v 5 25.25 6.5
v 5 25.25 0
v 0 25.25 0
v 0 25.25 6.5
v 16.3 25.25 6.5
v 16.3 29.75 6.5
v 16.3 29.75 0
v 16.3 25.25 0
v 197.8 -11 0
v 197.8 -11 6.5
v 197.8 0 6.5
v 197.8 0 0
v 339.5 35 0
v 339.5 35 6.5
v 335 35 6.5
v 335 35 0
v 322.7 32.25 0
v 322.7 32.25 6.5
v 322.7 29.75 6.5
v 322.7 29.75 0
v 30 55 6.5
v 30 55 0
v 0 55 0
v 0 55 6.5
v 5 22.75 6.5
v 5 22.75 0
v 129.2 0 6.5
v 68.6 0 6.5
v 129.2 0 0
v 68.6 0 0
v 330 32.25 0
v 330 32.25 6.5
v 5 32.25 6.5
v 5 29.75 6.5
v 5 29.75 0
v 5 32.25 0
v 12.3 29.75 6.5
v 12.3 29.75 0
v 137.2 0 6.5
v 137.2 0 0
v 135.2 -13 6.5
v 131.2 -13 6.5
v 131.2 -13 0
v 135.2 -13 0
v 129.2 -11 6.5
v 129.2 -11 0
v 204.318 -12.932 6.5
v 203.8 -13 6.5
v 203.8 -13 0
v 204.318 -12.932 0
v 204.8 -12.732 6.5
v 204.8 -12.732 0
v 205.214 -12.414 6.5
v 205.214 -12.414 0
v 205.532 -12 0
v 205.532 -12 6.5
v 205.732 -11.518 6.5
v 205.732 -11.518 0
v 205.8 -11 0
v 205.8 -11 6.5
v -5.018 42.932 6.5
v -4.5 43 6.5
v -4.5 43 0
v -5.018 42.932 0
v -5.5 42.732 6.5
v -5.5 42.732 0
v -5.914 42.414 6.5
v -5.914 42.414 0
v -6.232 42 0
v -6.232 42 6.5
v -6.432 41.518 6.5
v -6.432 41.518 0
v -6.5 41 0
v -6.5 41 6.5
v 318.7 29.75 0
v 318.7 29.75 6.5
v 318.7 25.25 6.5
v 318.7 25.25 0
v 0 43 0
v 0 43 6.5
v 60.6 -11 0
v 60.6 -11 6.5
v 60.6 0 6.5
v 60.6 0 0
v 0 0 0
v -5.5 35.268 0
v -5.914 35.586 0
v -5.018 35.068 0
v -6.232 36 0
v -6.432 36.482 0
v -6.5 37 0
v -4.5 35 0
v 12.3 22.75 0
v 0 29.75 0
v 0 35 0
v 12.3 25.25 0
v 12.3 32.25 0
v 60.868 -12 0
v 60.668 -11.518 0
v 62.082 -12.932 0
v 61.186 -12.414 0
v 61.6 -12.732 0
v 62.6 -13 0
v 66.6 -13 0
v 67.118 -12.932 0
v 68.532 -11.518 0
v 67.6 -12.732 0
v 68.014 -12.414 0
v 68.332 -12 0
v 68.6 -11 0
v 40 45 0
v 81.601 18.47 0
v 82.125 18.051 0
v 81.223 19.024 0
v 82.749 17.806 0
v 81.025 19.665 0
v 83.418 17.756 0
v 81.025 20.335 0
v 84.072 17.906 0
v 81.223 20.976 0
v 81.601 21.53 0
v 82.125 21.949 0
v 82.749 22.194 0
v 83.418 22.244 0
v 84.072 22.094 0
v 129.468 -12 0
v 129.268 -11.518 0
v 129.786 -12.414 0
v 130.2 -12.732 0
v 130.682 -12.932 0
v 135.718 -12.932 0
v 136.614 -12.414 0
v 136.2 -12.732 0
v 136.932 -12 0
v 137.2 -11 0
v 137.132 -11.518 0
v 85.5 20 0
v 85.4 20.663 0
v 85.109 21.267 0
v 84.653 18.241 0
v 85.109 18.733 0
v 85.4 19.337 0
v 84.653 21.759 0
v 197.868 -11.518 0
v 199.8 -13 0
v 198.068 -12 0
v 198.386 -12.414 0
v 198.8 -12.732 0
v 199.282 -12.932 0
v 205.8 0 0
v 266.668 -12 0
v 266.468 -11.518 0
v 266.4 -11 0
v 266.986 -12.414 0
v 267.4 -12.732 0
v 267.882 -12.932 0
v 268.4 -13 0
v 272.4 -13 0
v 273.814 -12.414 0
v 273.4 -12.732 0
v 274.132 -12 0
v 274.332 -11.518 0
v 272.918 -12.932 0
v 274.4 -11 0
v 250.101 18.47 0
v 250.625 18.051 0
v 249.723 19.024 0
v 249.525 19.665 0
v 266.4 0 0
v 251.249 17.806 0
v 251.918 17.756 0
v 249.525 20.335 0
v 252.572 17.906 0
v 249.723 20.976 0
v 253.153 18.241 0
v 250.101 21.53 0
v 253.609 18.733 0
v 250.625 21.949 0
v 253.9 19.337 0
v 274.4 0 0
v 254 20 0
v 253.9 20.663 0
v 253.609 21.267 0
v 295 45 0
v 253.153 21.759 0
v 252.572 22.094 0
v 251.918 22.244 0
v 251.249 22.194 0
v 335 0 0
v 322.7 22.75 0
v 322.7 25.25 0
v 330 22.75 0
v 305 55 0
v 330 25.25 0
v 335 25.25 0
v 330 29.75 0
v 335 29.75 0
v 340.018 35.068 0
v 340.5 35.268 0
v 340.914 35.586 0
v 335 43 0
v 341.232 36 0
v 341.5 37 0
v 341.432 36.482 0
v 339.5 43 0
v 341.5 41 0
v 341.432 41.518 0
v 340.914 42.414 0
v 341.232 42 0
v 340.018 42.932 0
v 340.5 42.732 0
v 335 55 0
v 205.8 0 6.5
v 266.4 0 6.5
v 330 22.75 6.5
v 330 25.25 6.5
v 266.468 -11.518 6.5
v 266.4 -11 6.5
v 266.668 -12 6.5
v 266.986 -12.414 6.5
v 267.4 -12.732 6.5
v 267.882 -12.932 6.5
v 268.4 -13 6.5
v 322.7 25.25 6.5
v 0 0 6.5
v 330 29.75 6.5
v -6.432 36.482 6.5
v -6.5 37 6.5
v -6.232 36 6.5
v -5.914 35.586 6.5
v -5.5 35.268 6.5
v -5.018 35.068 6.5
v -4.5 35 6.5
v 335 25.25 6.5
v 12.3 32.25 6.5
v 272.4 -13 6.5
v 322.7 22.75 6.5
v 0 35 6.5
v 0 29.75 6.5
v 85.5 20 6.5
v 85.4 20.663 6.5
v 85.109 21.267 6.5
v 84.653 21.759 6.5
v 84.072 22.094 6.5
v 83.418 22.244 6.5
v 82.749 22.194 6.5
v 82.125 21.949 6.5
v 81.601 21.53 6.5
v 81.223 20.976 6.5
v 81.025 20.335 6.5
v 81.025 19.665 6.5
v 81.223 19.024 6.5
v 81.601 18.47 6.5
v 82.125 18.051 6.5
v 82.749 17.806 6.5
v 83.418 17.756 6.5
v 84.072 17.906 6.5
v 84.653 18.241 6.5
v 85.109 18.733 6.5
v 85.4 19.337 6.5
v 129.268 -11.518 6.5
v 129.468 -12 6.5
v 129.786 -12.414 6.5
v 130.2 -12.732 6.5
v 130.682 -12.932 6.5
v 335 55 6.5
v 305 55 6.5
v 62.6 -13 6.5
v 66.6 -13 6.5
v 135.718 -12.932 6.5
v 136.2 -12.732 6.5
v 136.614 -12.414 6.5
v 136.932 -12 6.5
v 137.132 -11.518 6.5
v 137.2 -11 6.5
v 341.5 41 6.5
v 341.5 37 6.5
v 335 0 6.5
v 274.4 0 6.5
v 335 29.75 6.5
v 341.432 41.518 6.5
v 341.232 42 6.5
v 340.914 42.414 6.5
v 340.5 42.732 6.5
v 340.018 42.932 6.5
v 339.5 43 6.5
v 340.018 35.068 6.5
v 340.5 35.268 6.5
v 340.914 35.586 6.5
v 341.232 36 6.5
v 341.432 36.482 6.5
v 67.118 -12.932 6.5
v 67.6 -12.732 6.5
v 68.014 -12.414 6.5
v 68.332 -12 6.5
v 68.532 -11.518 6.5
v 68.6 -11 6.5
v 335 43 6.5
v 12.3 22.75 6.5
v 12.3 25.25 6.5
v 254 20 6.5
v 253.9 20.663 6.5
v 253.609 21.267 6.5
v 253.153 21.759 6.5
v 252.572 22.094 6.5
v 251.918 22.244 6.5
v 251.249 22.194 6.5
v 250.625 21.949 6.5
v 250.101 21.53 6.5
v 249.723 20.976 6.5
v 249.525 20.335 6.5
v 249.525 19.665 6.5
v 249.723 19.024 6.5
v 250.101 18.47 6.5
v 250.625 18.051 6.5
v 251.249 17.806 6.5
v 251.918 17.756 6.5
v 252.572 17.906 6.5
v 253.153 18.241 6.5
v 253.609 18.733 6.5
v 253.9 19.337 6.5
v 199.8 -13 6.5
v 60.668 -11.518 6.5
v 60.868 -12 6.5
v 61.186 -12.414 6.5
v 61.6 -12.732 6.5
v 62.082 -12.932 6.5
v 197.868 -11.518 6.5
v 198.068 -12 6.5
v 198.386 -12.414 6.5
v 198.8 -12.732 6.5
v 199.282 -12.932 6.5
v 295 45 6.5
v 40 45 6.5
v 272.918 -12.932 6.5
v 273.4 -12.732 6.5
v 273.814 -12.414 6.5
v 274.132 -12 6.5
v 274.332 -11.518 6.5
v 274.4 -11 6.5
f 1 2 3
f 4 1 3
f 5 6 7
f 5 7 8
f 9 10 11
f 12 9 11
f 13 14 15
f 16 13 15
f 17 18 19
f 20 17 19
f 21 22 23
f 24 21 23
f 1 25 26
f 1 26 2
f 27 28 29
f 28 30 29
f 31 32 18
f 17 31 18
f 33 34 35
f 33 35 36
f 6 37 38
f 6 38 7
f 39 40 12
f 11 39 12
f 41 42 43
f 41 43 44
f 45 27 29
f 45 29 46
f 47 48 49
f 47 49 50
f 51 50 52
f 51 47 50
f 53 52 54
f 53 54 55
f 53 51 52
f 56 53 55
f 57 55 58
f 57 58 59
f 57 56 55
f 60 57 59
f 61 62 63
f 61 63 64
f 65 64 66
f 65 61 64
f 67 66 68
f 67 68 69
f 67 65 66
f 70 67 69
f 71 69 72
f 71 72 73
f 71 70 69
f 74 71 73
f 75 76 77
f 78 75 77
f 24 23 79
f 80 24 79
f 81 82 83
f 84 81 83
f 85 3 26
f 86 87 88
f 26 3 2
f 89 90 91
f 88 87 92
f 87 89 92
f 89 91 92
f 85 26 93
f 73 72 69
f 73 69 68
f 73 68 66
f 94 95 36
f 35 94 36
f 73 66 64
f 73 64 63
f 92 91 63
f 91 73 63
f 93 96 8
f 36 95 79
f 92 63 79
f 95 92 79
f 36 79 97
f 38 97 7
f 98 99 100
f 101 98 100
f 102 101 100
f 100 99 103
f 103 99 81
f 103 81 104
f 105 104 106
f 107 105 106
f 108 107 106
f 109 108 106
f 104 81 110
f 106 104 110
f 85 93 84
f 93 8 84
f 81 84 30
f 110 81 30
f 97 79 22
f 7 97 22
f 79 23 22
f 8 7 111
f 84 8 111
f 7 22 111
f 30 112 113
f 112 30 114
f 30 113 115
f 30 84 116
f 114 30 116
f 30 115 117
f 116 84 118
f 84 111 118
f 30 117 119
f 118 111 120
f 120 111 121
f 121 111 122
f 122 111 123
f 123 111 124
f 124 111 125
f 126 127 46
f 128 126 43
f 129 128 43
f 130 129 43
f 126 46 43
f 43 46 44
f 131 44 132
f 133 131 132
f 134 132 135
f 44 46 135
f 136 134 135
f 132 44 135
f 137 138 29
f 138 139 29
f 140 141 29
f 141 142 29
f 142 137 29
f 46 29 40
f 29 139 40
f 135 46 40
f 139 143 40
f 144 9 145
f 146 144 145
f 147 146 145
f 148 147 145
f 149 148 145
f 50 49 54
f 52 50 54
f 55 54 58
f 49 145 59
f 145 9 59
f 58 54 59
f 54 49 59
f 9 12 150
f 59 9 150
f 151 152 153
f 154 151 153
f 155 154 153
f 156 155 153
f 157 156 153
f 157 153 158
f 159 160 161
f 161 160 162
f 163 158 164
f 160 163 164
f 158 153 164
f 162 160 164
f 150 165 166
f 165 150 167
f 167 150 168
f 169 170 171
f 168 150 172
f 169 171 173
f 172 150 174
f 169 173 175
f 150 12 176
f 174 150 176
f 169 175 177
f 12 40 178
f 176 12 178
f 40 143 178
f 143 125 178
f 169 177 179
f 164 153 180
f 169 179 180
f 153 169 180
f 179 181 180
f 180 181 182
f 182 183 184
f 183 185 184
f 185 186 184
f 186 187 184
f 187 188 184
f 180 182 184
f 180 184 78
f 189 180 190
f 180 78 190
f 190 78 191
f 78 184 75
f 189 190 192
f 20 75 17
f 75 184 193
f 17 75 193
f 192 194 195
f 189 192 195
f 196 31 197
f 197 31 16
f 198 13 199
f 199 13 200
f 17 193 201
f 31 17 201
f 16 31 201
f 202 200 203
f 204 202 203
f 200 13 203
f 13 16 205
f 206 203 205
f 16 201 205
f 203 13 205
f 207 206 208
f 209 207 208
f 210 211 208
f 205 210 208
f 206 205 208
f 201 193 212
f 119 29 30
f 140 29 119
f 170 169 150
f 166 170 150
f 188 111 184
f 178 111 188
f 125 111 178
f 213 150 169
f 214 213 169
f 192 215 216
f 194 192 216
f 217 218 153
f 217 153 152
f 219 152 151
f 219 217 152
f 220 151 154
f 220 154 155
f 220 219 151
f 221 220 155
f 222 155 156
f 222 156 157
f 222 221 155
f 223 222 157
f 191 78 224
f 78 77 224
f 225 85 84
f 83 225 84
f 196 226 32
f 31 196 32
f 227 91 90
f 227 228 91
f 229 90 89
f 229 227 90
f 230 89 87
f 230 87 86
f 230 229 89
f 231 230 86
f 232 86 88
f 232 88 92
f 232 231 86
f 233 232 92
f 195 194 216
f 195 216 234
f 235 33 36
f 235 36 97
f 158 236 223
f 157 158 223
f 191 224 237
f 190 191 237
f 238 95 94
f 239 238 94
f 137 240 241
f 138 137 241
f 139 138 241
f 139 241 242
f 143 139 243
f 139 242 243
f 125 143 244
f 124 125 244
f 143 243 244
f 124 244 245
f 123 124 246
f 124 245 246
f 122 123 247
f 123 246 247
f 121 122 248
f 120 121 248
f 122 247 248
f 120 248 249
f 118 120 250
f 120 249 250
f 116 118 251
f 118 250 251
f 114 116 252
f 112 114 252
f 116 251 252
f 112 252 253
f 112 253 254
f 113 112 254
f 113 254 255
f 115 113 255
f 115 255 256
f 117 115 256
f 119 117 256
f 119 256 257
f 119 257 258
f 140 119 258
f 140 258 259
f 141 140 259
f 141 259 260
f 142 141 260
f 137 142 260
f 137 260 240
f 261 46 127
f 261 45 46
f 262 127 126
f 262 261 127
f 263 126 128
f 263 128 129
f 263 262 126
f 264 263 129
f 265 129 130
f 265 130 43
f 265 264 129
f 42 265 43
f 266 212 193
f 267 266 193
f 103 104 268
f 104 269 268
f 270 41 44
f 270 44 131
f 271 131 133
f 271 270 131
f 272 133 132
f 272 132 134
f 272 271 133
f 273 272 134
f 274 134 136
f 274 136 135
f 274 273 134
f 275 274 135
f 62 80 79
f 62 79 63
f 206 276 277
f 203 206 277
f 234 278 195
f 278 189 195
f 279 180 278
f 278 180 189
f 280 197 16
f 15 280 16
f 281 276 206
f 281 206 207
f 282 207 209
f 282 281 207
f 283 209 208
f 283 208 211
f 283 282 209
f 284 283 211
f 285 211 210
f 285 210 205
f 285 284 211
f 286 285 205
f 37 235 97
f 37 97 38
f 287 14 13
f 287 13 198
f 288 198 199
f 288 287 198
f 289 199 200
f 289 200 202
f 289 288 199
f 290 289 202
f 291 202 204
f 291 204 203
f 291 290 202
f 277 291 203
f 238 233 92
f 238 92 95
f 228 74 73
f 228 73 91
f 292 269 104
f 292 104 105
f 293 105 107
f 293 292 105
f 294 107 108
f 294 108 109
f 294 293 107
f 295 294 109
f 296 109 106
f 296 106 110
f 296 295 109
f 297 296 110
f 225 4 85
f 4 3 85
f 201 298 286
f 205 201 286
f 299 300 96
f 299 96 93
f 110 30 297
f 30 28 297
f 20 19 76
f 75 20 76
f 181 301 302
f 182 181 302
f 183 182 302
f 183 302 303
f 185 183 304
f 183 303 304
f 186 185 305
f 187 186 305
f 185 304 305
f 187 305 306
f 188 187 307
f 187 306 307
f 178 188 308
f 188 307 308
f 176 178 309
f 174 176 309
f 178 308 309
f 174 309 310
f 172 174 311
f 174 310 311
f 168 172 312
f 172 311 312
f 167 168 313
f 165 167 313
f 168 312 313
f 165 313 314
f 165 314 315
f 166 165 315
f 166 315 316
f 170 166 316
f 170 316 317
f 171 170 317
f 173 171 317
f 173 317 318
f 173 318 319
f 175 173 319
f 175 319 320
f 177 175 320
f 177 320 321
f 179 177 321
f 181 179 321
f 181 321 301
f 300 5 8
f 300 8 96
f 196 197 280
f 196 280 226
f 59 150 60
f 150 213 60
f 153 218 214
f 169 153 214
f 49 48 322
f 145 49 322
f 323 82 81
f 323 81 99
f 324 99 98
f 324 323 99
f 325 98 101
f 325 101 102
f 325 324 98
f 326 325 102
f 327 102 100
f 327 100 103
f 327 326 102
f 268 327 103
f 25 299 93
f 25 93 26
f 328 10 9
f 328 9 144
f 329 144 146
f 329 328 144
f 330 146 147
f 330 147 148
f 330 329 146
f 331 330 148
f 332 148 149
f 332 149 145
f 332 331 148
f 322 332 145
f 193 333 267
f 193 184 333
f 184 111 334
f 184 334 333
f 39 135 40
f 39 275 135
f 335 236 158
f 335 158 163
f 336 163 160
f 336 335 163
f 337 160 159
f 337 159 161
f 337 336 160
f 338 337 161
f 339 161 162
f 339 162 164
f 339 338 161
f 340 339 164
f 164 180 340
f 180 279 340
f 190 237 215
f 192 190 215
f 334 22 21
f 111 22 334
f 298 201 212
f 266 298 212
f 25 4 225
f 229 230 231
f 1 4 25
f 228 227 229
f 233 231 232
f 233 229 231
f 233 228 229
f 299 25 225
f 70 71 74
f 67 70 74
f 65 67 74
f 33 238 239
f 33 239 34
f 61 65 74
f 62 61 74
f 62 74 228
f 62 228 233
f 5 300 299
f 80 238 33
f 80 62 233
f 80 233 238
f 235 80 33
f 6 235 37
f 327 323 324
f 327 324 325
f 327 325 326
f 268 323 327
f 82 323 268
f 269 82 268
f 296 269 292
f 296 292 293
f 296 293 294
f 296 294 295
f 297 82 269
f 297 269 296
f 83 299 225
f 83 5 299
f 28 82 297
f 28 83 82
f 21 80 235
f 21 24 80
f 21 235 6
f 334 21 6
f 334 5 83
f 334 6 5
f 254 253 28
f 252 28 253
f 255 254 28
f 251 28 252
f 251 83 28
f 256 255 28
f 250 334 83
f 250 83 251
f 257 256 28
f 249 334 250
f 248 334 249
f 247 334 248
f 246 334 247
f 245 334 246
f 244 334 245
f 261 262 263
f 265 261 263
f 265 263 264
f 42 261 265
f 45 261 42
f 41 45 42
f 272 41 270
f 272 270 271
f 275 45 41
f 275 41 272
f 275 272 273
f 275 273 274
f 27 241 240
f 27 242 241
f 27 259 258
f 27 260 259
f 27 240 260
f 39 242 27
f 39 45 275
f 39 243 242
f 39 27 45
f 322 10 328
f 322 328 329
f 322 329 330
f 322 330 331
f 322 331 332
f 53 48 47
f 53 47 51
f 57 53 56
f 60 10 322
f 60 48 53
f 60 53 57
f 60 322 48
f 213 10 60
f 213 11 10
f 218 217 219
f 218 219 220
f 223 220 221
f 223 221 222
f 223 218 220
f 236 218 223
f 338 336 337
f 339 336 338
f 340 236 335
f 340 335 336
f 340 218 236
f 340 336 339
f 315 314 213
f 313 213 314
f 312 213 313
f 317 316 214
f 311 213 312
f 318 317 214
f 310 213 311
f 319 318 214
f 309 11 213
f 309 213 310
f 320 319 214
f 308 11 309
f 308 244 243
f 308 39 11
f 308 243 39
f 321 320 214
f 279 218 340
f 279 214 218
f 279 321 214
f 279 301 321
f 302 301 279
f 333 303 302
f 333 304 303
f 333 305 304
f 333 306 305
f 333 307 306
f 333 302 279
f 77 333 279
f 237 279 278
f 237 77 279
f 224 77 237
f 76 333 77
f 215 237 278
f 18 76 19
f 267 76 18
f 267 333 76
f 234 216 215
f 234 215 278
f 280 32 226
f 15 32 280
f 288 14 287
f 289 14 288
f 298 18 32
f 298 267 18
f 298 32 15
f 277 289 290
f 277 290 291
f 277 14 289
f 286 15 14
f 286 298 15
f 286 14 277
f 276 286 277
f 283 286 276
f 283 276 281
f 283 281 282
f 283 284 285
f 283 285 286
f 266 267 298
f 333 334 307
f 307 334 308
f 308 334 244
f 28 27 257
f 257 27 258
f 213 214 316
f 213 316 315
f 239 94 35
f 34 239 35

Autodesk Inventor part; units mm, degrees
ref_plane "YZ Plane" through (0, 0, 0) normal (1, 0, 0) x (0, 1, 0)
ref_plane "XZ Plane" through (0, 0, 0) normal (0, 1, 0) x (-1, 0, 0)
ref_plane "XY Plane" through (0, 0, 0) normal (0, 0, 1) x (1, 0, 0)
sketch "Sketch1" plane through (0, 0, 0) normal (0, 0, 1) x (1, 0, 0)
  line L0 (0, 0) -> (335, 0)
  line L1 (335, 0) -> (335, 55)
  line L2 (0, 55) -> (0, 0)
  line L3 (30, 55) -> (40, 45)
  line L4 (40, 45) -> (295, 45)
  line L5 (295, 45) -> (305, 55)
  line L6 (335, 55) -> (305, 55)
  line L7 (30, 55) -> (0, 55)
  dimension "d0" = 335
  dimension "d1" = 55
  dimension "d2" = 45
  dimension "d3" = 30
  dimension "d4" = 10
  dimension "d5" = 30
extrude "Extrusion1" add sketch "Sketch1" along normal blind 6.5
sketch "Sketch2" plane through (0, 0, 6.5) normal (0, 0, 1) x (1, 0, 0)
  line L0 (0, 0) -> (335, 0) projected
  line L1 (295, 45) -> (40, 45) projected
  line L2 (0, 55) -> (0, 0) projected
  line L3 (0, 25.25) -> (0, 29.75)
  line L4 (16.3, 29.75) -> (16.3, 25.25)
  line L5 (5, 32.25) -> (12.3, 32.25)
  line L6 (12.3, 22.75) -> (5, 22.75)
  line L7 (0, 29.75) -> (5, 29.75)
  line L8 (12.3, 29.75) -> (16.3, 29.75)
  line L9 (16.3, 25.25) -> (12.3, 25.25)
  line L10 (5, 25.25) -> (0, 25.25)
  line L11 (5, 22.75) -> (5, 25.25)
  line L12 (5, 29.75) -> (5, 32.25)
  line L13 (12.3, 32.25) -> (12.3, 29.75)
  line L14 (12.3, 25.25) -> (12.3, 22.75)
  line L15 (167.5, 0) -> (167.5, 45) construction
  line L16 (335, 25.25) -> (335, 29.75)
  line L17 (318.7, 29.75) -> (318.7, 25.25)
  line L18 (330, 32.25) -> (322.7, 32.25)
  line L19 (322.7, 22.75) -> (330, 22.75)
  line L20 (335, 29.75) -> (330, 29.75)
  line L21 (322.7, 29.75) -> (318.7, 29.75)
  line L22 (318.7, 25.25) -> (322.7, 25.25)
  line L23 (330, 25.25) -> (335, 25.25)
  line L24 (330, 22.75) -> (330, 25.25)
  line L25 (330, 29.75) -> (330, 32.25)
  line L26 (322.7, 32.25) -> (322.7, 29.75)
  line L27 (322.7, 25.25) -> (322.7, 22.75)
  point P0 (0, 27.5)
  point P1 (0, 27.5)
  point P2 (335, 27.5)
  point P3 (335, 27.5)
  dimension "d8" = 4.5
  dimension "d9" = 2.5
  dimension "d10" = 2.5
  dimension "d11" = 5
  dimension "d12" = 7.3
  dimension "d13" = 4
extrude "Extrusion2" cut sketch "Sketch2" against normal through all
sketch "Sketch3" plane through (0, 0, 6.5) normal (0, 0, 1) x (1, 0, 0)
  line L0 (0, 25.25) -> (0, 0) projected
  line L1 (0, 0) -> (335, 0) projected
  line L2 (335, 0) -> (335, 25.25) projected
  line L3 (335, 29.75) -> (335, 55) projected
  line L4 (0, 55) -> (0, 29.75) projected
  line L5 (16.3, 29.75) -> (16.3, 25.25) projected
  line L6 (0, 43) -> (-4.5, 43)
  line L7 (-6.5, 41) -> (-6.5, 37)
  line L8 (-4.5, 35) -> (0, 35)
  line L9 (0, 35) -> (0, 43)
  line L10 (0, 20) -> (-4.5, 20)
  line L11 (-6.5, 18) -> (-6.5, 14)
  line L12 (-4.5, 12) -> (0, 12)
  line L13 (0, 12) -> (0, 20)
  arc A0 (-4.5, 43) -> (-6.5, 41) centre (-4.5, 41) ccw
  arc A1 (-6.5, 37) -> (-4.5, 35) centre (-4.5, 37) ccw
  arc A2 (-4.5, 20) -> (-6.5, 18) centre (-4.5, 18) ccw
  arc A3 (-6.5, 14) -> (-4.5, 12) centre (-4.5, 14) ccw
  line L14 (335, 43) -> (339.5, 43)
  line L15 (341.5, 41) -> (341.5, 37)
  line L16 (339.5, 35) -> (335, 35)
  line L17 (335, 35) -> (335, 43)
  line L18 (335, 20) -> (339.5, 20)
  line L19 (341.5, 18) -> (341.5, 14)
  line L20 (339.5, 12) -> (335, 12)
  line L21 (335, 12) -> (335, 20)
  arc A4 (341.5, 41) -> (339.5, 43) centre (339.5, 41) ccw
  arc A5 (339.5, 35) -> (341.5, 37) centre (339.5, 37) ccw
  arc A6 (341.5, 18) -> (339.5, 20) centre (339.5, 18) ccw
  arc A7 (339.5, 12) -> (341.5, 14) centre (339.5, 14) ccw
  line L22 (197.8, 0) -> (205.8, 0)
  line L23 (205.8, 0) -> (205.8, -11)
  line L24 (203.8, -13) -> (199.8, -13)
  line L25 (197.8, -11) -> (197.8, 0)
  line L26 (137.2, 0) -> (129.2, 0)
  line L27 (129.2, 0) -> (129.2, -11)
  line L28 (131.2, -13) -> (135.2, -13)
  line L29 (137.2, -11) -> (137.2, 0)
  line L30 (60.6, 0) -> (68.6, 0)
  line L31 (68.6, 0) -> (68.6, -11)
  line L32 (66.6, -13) -> (62.6, -13)
  line L33 (60.6, -11) -> (60.6, 0)
  line L34 (266.4, 0) -> (274.4, 0)
  line L35 (274.4, 0) -> (274.4, -11)
  line L36 (272.4, -13) -> (268.4, -13)
  line L37 (266.4, -11) -> (266.4, 0)
  arc A8 (60.6, -11) -> (62.6, -13) centre (62.6, -11) ccw
  arc A9 (66.6, -13) -> (68.6, -11) centre (66.6, -11) ccw
  arc A10 (129.2, -11) -> (131.2, -13) centre (131.2, -11) ccw
  arc A11 (135.2, -13) -> (137.2, -11) centre (135.2, -11) ccw
  arc A12 (197.8, -11) -> (199.8, -13) centre (199.8, -11) ccw
  arc A13 (203.8, -13) -> (205.8, -11) centre (203.8, -11) ccw
  arc A14 (266.4, -11) -> (268.4, -13) centre (268.4, -11) ccw
  arc A15 (272.4, -13) -> (274.4, -11) centre (272.4, -11) ccw
  line L38 (68.6, -5.5) -> (129.2, -5.5) construction
  line L39 (137.2, -5.5) -> (197.8, -5.5) construction
  line L40 (205.8, -5.5) -> (266.4, -5.5) construction
  line L41 (274.4, -5.5) -> (335, -5.5) construction
  line L42 (60.6, -5.5) -> (0, -5.5) construction
  point P0 (16.3, 27.5)
  point P1 (167.5, 0)
  dimension "d16" = 2
  dimension "d17" = 8
  dimension "d18" = 8
  dimension "d19" = 15
  dimension "d20" = 7.5
  dimension "d21" = 6.5
  dimension "d22" = 2
  dimension "d23" = 6.5
  dimension "d24" = 2
  dimension "d25" = 8
  dimension "d26" = 8
  dimension "d27" = 8
  dimension "d28" = 8
  dimension "d29" = 13
extrude "Extrusion3" add sketch "Sketch3" against normal blind 6.5
sketch "Sketch4" plane through (0, 0, 6.5) normal (0, 0, 1) x (1, 0, 0)
  line L0 (0, 20) -> (-4.5, 20) projected
  arc A0 (-4.5, 20) -> (-6.5, 18) centre (-4.5, 18) ccw projected
  line L1 (-6.5, 18) -> (-6.5, 14) projected
  arc A1 (-6.5, 14) -> (-4.5, 12) centre (-4.5, 14) ccw projected
  line L2 (-4.5, 12) -> (0, 12) projected
  line L3 (335, 12) -> (339.5, 12) projected
  arc A2 (339.5, 12) -> (341.5, 14) centre (339.5, 14) ccw projected
  line L4 (341.5, 14) -> (341.5, 18) projected
  arc A3 (341.5, 18) -> (339.5, 20) centre (339.5, 18) ccw projected
  line L5 (339.5, 20) -> (335, 20) projected
  line L6 (5, 22.75) -> (5, 25.25) projected
  line L7 (0, 20) -> (0, 12)
  line L8 (335, 20) -> (335, 12)
extrude "Extrusion4" cut sketch "Sketch4" against normal through all
sketch "Sketch5" plane through (0, 0, 6.5) normal (0, 0, 1) x (1, 0, 0)
  line L0 (0, 25.25) -> (0, 0) projected
  line L1 (0, 0) -> (60.6, 0) projected
  line L2 (335, 0) -> (335, 25.25) projected
  circle A0 centre (83.25, 20) radius 2.25
  circle A1 centre (251.75, 20) radius 2.25
  dimension "d34" = 4.5
  dimension "d35" = 20
  dimension "d36" = 83.25
  dimension "d37" = 83.25
extrude "Extrusion5" cut sketch "Sketch5" against normal through all
equation "\"d5\" = d3"
equation "\"d23\" = d21"
equation "\"d37\" = d36"
properties part number "frame_brace_top"
